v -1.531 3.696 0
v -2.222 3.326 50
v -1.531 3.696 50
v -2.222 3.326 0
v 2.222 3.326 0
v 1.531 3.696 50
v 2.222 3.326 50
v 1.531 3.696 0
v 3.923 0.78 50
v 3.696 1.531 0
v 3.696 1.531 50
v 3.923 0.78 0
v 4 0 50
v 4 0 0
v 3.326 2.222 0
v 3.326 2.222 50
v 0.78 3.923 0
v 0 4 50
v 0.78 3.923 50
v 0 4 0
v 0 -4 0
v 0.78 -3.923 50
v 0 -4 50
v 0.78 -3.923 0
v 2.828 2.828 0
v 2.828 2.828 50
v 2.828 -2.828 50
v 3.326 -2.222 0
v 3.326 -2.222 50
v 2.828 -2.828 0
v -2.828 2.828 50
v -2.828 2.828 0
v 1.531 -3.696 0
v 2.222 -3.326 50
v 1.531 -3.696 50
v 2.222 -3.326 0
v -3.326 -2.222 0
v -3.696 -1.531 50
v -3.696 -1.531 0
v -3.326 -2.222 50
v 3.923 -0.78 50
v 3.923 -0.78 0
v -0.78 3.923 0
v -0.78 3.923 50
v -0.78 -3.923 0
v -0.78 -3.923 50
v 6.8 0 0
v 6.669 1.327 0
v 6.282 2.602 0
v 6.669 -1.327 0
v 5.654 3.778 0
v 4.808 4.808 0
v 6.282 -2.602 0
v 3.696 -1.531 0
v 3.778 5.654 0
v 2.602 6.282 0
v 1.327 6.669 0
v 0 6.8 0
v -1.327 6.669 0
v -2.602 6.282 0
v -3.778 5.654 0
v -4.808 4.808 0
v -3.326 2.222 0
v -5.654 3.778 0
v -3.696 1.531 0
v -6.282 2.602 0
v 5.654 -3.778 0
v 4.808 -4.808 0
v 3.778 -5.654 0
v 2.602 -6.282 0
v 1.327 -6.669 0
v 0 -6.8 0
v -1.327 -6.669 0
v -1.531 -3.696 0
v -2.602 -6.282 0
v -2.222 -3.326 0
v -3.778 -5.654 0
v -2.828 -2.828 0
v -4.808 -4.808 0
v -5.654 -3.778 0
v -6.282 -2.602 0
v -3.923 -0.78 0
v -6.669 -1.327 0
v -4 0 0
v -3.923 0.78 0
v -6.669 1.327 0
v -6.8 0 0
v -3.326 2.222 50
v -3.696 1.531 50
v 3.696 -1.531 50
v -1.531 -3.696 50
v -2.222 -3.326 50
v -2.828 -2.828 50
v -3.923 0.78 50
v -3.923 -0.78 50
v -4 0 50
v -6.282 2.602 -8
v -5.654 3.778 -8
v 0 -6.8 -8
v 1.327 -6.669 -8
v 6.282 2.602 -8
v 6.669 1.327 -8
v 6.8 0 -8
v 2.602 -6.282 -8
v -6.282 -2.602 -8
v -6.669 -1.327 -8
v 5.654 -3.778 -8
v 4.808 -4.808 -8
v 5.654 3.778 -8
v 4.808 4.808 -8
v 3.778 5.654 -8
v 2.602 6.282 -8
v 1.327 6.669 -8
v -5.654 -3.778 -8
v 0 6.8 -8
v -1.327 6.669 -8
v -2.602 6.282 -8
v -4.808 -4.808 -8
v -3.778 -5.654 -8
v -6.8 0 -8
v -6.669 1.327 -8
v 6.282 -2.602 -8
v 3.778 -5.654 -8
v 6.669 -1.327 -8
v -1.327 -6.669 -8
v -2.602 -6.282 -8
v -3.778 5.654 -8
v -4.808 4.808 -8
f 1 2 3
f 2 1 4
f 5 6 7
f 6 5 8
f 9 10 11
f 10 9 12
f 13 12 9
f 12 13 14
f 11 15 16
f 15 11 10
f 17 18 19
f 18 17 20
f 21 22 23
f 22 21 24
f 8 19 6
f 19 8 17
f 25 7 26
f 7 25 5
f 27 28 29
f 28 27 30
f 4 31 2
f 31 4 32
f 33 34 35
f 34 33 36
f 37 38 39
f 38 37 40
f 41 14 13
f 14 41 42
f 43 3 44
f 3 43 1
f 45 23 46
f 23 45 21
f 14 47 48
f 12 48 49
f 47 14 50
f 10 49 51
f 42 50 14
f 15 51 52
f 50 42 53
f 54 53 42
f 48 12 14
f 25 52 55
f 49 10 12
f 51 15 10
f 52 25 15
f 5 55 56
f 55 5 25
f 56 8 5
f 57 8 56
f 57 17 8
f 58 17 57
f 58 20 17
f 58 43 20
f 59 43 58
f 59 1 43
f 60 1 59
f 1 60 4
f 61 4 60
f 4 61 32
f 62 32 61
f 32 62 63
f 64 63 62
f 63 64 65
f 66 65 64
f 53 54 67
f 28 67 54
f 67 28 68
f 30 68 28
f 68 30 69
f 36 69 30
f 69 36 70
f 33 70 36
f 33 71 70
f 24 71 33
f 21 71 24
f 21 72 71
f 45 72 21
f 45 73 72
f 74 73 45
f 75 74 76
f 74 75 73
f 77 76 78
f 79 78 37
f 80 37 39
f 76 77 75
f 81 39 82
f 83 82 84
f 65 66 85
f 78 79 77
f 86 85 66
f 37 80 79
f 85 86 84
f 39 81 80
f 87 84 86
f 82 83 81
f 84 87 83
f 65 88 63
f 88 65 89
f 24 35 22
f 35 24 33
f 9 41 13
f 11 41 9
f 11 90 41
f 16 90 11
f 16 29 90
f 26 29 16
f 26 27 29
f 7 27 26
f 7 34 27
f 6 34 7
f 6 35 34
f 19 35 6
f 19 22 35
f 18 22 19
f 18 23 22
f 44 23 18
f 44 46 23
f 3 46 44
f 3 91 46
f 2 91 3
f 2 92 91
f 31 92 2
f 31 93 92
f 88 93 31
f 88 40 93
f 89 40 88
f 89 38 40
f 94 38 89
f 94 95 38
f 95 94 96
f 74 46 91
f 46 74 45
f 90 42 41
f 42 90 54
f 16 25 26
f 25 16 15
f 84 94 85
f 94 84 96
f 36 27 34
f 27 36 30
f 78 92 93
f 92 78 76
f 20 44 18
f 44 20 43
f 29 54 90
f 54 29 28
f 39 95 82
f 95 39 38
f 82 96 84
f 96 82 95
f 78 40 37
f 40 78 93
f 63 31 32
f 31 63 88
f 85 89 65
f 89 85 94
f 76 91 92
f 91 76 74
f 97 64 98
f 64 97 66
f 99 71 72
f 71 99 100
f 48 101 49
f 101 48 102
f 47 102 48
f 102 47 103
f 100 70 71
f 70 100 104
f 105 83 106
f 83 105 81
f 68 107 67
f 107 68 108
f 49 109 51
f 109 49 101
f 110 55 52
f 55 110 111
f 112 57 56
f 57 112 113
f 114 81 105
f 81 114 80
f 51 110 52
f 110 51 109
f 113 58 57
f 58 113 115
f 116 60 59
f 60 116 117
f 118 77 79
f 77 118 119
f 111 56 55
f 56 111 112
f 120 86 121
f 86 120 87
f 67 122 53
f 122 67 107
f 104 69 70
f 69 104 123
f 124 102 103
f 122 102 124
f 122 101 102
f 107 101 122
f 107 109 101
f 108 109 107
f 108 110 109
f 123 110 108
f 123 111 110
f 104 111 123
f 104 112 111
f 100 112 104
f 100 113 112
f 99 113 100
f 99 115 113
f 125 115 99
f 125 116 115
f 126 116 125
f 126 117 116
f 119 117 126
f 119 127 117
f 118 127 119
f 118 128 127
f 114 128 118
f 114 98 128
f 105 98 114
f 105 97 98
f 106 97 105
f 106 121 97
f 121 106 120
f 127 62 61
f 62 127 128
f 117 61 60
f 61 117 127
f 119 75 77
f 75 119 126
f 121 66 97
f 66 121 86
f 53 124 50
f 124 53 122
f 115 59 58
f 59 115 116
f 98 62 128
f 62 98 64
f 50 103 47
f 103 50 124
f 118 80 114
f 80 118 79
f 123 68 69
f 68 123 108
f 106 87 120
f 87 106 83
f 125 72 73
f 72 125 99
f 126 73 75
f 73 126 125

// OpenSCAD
// Purchased hardware envelope; no modeled threads, not print.
$fn=32;
union(){cylinder(d=8,h=50);translate([0,0,-8])cylinder(d=13.6,h=8);}
